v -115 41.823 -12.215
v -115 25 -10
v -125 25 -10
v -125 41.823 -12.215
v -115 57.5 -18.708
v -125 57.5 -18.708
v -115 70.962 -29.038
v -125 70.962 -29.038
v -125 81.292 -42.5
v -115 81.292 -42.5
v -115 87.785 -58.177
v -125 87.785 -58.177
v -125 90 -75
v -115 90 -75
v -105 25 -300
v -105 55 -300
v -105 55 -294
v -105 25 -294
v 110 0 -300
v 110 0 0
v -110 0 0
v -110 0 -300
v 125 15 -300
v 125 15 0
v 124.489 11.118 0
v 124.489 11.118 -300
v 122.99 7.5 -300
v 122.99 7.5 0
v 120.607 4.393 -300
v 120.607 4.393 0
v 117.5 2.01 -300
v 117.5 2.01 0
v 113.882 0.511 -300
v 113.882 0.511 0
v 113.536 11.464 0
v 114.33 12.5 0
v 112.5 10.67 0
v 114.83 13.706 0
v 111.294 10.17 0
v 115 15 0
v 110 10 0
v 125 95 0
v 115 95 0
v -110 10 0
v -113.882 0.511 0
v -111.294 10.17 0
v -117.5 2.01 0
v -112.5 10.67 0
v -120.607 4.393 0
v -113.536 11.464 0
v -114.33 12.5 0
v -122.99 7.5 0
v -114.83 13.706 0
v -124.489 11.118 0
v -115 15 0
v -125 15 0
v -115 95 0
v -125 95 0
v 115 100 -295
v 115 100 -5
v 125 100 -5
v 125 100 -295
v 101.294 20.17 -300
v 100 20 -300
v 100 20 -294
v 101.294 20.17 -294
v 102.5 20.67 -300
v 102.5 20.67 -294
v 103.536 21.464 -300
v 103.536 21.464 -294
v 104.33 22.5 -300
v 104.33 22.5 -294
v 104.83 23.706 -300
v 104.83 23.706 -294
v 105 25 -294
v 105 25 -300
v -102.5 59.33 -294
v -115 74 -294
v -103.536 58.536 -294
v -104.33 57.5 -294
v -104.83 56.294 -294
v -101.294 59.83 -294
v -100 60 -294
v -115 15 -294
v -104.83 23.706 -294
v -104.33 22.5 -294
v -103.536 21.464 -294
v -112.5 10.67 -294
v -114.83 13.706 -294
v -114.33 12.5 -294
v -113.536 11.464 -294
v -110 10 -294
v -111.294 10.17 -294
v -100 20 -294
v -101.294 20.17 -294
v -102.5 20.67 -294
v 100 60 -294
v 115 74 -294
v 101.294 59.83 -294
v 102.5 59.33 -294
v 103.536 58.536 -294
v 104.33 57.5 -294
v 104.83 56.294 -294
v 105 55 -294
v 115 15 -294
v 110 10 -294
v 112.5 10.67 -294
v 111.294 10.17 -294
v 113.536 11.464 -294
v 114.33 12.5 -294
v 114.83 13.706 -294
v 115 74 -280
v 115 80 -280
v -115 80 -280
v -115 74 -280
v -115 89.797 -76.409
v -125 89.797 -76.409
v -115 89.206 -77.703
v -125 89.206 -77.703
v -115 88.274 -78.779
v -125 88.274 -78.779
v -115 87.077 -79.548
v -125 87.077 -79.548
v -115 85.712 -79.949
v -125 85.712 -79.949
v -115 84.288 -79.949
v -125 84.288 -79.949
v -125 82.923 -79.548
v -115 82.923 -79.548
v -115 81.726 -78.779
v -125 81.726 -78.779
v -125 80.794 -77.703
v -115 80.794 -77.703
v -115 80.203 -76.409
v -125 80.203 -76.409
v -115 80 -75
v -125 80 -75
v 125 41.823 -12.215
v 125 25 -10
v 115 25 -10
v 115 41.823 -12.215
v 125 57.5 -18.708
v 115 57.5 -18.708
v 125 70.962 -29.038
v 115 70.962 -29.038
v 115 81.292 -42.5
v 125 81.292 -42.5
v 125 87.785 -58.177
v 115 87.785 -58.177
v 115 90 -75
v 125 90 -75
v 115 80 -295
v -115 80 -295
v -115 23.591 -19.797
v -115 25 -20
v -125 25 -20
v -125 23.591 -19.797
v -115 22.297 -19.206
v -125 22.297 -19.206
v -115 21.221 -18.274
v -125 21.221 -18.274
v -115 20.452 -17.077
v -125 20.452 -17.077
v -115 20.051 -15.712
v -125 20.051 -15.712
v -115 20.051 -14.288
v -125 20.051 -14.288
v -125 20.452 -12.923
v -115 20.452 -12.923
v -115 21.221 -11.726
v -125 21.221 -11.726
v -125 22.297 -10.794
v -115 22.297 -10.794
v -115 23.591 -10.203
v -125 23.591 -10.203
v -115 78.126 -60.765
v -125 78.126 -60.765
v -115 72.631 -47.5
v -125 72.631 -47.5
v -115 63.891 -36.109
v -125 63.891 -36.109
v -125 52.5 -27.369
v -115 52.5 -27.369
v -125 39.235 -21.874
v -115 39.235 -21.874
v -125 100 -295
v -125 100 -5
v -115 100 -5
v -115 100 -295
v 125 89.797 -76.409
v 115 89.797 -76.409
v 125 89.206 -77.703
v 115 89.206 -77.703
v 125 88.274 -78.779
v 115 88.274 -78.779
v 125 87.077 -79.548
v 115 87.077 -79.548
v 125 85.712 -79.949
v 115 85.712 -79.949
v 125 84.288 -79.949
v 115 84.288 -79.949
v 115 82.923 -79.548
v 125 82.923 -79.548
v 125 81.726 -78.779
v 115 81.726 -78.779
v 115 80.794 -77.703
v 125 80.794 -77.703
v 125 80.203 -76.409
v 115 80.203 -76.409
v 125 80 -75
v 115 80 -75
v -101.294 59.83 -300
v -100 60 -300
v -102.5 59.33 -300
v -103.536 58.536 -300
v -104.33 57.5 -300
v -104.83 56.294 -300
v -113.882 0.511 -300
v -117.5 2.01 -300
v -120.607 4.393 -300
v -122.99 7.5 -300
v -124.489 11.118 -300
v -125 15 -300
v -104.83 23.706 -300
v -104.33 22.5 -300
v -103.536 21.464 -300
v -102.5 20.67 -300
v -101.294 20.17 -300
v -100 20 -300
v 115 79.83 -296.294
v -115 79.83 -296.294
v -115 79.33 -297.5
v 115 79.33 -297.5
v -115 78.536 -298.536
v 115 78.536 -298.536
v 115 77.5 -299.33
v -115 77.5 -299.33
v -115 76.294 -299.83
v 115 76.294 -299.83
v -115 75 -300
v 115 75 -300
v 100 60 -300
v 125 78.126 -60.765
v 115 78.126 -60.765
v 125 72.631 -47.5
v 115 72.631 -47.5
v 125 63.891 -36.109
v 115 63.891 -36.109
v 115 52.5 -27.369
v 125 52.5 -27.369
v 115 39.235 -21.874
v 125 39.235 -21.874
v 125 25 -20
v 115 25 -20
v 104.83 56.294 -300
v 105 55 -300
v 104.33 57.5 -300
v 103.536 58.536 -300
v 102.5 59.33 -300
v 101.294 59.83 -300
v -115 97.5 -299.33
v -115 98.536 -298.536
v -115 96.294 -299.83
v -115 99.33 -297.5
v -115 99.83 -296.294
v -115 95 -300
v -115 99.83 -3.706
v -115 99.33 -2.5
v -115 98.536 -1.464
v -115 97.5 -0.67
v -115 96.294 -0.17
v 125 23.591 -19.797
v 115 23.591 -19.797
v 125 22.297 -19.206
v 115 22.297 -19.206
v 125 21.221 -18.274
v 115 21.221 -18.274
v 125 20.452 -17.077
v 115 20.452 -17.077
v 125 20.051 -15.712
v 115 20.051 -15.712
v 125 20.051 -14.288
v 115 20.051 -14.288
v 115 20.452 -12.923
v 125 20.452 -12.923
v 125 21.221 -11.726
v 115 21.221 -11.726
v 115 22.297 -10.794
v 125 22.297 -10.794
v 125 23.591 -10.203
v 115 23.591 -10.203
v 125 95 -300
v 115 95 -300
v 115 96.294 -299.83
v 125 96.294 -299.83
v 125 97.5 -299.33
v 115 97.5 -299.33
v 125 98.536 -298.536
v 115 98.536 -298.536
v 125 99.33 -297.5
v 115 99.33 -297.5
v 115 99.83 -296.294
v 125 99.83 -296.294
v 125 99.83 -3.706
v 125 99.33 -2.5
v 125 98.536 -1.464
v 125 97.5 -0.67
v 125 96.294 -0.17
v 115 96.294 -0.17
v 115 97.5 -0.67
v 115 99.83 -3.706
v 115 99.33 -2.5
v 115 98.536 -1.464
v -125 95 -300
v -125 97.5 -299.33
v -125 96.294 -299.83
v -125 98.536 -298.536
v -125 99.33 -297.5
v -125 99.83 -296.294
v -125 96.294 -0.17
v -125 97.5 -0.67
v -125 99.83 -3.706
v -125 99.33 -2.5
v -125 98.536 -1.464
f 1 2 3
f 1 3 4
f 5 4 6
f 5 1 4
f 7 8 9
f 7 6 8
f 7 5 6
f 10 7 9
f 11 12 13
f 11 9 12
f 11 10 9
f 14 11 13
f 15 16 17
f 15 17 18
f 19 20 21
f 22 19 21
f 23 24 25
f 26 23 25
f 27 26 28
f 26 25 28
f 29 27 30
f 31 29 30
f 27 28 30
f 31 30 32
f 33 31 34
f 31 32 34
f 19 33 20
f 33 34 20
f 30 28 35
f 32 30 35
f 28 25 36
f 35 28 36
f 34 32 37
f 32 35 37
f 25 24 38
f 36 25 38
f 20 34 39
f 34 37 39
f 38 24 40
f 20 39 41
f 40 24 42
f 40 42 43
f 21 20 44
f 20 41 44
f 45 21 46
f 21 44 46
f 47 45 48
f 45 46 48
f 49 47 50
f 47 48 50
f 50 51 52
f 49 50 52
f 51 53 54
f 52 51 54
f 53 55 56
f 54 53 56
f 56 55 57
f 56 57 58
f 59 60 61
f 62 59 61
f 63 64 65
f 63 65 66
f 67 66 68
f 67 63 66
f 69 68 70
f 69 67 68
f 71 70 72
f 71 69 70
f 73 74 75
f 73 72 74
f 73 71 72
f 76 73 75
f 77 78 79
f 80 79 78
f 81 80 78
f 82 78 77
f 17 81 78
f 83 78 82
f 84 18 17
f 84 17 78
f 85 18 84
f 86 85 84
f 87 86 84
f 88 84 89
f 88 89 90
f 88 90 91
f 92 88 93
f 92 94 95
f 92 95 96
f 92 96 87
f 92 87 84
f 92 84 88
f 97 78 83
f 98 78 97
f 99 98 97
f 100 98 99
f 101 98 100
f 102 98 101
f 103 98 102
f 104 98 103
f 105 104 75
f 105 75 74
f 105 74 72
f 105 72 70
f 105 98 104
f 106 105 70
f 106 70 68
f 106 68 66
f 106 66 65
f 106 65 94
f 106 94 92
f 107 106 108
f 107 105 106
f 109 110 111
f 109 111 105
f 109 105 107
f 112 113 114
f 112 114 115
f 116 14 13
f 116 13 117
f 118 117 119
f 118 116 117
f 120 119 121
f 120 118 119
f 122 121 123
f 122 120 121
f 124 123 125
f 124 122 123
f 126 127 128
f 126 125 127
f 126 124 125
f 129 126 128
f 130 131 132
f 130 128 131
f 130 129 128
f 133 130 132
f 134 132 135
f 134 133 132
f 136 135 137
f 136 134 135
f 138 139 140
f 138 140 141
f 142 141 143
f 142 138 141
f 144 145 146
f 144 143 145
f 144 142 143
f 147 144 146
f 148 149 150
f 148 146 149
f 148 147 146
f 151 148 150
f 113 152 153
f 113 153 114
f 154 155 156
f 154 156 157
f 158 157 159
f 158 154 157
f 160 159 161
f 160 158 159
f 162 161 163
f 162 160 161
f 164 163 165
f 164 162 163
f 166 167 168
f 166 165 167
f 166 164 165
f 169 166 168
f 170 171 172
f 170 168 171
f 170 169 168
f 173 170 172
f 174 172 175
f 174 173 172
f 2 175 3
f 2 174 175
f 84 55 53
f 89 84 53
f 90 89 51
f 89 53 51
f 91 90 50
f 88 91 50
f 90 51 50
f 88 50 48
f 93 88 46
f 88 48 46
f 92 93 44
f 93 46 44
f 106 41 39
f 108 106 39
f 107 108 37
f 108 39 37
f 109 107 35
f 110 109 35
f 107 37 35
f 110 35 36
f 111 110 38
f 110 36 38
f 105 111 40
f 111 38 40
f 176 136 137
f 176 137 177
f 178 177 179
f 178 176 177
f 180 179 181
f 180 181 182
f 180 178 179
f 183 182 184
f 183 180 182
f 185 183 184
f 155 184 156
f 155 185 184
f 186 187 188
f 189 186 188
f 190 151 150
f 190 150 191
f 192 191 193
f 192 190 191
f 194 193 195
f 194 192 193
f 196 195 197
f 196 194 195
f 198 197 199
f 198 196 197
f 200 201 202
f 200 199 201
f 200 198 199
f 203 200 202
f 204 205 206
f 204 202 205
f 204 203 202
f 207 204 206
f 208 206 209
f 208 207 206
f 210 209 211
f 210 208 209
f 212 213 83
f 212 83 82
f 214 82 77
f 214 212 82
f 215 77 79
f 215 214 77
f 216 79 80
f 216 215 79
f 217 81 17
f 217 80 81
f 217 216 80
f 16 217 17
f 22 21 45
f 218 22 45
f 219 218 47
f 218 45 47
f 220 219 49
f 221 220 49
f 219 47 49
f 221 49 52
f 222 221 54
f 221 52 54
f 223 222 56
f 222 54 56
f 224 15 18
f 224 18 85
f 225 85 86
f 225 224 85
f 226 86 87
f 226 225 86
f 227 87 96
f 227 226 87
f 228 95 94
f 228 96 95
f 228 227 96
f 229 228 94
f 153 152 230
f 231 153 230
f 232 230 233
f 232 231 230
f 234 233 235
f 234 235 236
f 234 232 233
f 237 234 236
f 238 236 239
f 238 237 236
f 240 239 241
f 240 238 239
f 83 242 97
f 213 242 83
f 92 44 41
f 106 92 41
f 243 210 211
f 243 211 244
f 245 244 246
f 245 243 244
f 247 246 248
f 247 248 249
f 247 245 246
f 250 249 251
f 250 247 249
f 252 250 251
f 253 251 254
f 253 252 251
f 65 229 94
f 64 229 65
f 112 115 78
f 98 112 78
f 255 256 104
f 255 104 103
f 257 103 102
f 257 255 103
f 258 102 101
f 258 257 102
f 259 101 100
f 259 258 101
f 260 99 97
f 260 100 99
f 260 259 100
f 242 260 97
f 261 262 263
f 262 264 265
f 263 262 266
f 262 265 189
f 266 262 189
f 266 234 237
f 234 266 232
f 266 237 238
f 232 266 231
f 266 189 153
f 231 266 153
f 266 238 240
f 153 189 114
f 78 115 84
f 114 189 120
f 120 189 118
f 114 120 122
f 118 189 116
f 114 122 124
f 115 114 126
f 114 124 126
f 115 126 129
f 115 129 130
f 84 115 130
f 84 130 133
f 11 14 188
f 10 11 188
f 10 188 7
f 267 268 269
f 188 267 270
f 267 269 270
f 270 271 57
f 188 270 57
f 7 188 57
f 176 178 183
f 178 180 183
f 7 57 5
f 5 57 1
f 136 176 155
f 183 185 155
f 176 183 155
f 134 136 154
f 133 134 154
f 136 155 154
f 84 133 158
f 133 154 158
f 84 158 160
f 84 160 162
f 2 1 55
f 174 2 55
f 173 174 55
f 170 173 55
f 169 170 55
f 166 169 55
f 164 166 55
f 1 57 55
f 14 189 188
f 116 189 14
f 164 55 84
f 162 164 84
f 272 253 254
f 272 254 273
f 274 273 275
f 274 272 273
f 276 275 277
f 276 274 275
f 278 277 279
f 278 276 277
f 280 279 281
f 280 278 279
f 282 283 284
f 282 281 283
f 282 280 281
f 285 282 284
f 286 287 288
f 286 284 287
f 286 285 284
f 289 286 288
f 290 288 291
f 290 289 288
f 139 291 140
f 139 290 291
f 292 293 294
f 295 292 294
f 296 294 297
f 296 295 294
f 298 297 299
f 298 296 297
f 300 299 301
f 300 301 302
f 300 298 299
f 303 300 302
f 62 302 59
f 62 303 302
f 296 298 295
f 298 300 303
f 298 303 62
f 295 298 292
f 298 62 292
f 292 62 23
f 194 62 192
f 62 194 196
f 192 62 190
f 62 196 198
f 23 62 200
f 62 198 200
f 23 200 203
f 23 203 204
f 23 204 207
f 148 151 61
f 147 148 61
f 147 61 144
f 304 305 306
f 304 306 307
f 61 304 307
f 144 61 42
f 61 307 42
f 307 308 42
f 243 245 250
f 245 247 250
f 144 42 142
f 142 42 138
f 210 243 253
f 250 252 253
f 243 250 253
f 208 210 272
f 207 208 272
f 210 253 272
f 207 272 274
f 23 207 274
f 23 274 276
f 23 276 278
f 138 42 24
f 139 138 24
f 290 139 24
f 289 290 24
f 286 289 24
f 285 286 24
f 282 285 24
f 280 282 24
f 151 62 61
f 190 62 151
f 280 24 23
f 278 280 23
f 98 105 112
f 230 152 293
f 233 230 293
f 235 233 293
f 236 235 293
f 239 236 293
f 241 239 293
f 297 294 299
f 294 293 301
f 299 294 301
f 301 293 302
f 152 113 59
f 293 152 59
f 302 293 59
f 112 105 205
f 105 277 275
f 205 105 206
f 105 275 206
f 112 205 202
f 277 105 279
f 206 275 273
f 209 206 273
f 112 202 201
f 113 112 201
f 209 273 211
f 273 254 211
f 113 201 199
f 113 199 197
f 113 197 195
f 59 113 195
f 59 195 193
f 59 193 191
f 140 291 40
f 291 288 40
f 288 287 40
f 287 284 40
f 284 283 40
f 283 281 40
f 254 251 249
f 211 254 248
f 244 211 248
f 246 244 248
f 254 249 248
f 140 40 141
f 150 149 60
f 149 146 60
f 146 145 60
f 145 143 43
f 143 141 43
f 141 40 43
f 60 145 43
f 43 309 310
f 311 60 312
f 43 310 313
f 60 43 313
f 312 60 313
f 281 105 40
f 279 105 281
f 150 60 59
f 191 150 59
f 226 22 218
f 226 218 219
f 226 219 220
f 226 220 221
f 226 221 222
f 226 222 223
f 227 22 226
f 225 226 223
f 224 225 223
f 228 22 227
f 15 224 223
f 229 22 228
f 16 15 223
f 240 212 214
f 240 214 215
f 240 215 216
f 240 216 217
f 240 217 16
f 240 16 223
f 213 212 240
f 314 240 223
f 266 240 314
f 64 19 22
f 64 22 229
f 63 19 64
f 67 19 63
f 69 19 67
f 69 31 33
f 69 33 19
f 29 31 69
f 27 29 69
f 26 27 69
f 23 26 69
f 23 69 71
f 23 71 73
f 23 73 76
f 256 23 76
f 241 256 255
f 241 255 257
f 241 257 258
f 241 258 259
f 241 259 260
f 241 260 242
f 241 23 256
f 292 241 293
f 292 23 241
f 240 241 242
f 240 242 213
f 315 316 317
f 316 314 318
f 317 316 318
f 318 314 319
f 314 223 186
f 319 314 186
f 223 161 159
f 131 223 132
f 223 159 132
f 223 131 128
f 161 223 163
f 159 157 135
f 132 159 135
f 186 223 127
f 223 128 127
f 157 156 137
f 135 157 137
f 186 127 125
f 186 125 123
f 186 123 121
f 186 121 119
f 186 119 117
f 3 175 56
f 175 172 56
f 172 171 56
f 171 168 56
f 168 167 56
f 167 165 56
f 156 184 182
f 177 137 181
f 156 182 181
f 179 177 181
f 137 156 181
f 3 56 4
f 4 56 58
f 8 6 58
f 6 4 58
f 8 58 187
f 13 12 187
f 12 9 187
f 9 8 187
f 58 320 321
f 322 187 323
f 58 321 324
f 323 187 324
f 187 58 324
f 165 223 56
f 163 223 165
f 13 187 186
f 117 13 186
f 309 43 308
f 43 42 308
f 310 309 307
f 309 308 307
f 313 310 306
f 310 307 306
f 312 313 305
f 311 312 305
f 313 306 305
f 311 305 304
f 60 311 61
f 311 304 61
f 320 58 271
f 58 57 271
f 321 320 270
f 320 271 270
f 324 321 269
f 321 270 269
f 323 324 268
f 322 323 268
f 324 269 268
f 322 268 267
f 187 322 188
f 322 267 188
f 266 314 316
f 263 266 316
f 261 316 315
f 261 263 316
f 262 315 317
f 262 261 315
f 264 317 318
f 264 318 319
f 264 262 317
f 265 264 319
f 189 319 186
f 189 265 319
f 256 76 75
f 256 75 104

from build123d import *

# Parameters (mm, degrees)
EXTRUDE_THIN1_DEPTH     = 300
CUT_EXTRUDE1_DEPTH      = 341.036762718
CUT_EXTRUDE1_DEPTH_BACK = 341.036762718
BOSS_EXTRUDE1_REACH     = 398.989
CUT_EXTRUDE2_REACH      = 342.037
FILLET1_R               = 5


with BuildPart() as part:
    # Sketch1 → Extrude-Thin1 (new body)
    with BuildSketch(Plane.XY):
        with BuildLine():
            Line((125, 100), (125, 15))
            ThreePointArc((125, 15), (120.606601718, 4.393398282), (110, 0))
            Line((110, 0), (-110, 0))
            ThreePointArc((-110, 0), (-120.606601718, 4.393398282), (-125, 15))
            Line((-125, 15), (-125, 100))
            Line((-125, 100), (-115, 100))
            Line((-115, 100), (-115, 15))
            ThreePointArc((-115, 15), (-113.535533906, 11.464466094), (-110, 10))
            Line((-110, 10), (110, 10))
            ThreePointArc((110, 10), (113.535533906, 11.464466094), (115, 15))
            Line((115, 15), (115, 100))
            Line((115, 100), (125, 100))
        make_face()
    extrude(amount=-EXTRUDE_THIN1_DEPTH)

    # Sketch2 → Cut-Extrude1 (cut, two sides: drawn at the far end of the back side and taken through both)
    with BuildSketch(Plane.ZY.offset(-CUT_EXTRUDE1_DEPTH_BACK)):
        with BuildLine():
            ThreePointArc((-75, 80), (-36.109127035, 63.890872965), (-20, 25))
            ThreePointArc((-20, 25), (-15, 20), (-10, 25))
            ThreePointArc((-10, 25), (-29.038059223, 70.961940777), (-75, 90))
            ThreePointArc((-75, 90), (-80, 85), (-75, 80))
        make_face()
    extrude(amount=CUT_EXTRUDE1_DEPTH + CUT_EXTRUDE1_DEPTH_BACK, mode=Mode.SUBTRACT)

    # Boss-Extrude1: up to this face of the body (flat: up to its plane)
    boss_extrude1_end = Plane(part.part.faces().sort_by_distance((-115, 57.288670869, -154.695150869))[0])
    # Sketch3 → Boss-Extrude1 (add, up to the picked face)
    with BuildSketch(Plane.ZY.offset(-115), mode=Mode.PRIVATE) as boss_extrude1_sk1:
        Polygon((-300, 80), (-280, 80), (-280, 74), (-294, 74), (-294, 10), (-300, 10), align=None)
    boss_extrude1_tool1 = split(extrude(boss_extrude1_sk1.sketch, amount=BOSS_EXTRUDE1_REACH, mode=Mode.PRIVATE), bisect_by=boss_extrude1_end, keep=Keep.BOTH, mode=Mode.PRIVATE)
    add(boss_extrude1_tool1.solids().sort_by(Axis((115, 50.333333, -295.333333), (-1, 0, 0)))[0])

    # Sketch4 → Cut-Extrude2 (cut, up to next)
    with BuildSketch(Plane(origin=(0, 0, -300), x_dir=(-1, 0, 0), z_dir=(0, 0, -1)), mode=Mode.PRIVATE) as cut_extrude2_sk1:
        with BuildLine():
            Line((-100, 60), (100, 60))
            ThreePointArc((100, 60), (103.535533906, 58.535533906), (105, 55))
            Line((105, 55), (105, 25))
            ThreePointArc((105, 25), (103.535533906, 21.464466094), (100, 20))
            Line((100, 20), (-100, 20))
            ThreePointArc((-100, 20), (-103.535533906, 21.464466094), (-105, 25))
            Line((-105, 25), (-105, 55))
            ThreePointArc((-105, 55), (-103.535533906, 58.535533906), (-100, 60))
        make_face()
    cut_extrude2_tool1 = extrude(cut_extrude2_sk1.sketch, amount=-CUT_EXTRUDE2_REACH, mode=Mode.PRIVATE) & part.part
    add(cut_extrude2_tool1.solids().sort_by_distance((0, 40, -300))[0], mode=Mode.SUBTRACT)

    # Fillet1
    fillet1_edges = [part.edges().sort_by_distance(p)[0] for p in [
        (120, 100, 0),
        (-120, 100, 0),
        (120, 100, -300),
        (0, 80, -300),
        (-120, 100, -300),
    ]]
    fillet(fillet1_edges, radius=FILLET1_R)


solid = part.part
